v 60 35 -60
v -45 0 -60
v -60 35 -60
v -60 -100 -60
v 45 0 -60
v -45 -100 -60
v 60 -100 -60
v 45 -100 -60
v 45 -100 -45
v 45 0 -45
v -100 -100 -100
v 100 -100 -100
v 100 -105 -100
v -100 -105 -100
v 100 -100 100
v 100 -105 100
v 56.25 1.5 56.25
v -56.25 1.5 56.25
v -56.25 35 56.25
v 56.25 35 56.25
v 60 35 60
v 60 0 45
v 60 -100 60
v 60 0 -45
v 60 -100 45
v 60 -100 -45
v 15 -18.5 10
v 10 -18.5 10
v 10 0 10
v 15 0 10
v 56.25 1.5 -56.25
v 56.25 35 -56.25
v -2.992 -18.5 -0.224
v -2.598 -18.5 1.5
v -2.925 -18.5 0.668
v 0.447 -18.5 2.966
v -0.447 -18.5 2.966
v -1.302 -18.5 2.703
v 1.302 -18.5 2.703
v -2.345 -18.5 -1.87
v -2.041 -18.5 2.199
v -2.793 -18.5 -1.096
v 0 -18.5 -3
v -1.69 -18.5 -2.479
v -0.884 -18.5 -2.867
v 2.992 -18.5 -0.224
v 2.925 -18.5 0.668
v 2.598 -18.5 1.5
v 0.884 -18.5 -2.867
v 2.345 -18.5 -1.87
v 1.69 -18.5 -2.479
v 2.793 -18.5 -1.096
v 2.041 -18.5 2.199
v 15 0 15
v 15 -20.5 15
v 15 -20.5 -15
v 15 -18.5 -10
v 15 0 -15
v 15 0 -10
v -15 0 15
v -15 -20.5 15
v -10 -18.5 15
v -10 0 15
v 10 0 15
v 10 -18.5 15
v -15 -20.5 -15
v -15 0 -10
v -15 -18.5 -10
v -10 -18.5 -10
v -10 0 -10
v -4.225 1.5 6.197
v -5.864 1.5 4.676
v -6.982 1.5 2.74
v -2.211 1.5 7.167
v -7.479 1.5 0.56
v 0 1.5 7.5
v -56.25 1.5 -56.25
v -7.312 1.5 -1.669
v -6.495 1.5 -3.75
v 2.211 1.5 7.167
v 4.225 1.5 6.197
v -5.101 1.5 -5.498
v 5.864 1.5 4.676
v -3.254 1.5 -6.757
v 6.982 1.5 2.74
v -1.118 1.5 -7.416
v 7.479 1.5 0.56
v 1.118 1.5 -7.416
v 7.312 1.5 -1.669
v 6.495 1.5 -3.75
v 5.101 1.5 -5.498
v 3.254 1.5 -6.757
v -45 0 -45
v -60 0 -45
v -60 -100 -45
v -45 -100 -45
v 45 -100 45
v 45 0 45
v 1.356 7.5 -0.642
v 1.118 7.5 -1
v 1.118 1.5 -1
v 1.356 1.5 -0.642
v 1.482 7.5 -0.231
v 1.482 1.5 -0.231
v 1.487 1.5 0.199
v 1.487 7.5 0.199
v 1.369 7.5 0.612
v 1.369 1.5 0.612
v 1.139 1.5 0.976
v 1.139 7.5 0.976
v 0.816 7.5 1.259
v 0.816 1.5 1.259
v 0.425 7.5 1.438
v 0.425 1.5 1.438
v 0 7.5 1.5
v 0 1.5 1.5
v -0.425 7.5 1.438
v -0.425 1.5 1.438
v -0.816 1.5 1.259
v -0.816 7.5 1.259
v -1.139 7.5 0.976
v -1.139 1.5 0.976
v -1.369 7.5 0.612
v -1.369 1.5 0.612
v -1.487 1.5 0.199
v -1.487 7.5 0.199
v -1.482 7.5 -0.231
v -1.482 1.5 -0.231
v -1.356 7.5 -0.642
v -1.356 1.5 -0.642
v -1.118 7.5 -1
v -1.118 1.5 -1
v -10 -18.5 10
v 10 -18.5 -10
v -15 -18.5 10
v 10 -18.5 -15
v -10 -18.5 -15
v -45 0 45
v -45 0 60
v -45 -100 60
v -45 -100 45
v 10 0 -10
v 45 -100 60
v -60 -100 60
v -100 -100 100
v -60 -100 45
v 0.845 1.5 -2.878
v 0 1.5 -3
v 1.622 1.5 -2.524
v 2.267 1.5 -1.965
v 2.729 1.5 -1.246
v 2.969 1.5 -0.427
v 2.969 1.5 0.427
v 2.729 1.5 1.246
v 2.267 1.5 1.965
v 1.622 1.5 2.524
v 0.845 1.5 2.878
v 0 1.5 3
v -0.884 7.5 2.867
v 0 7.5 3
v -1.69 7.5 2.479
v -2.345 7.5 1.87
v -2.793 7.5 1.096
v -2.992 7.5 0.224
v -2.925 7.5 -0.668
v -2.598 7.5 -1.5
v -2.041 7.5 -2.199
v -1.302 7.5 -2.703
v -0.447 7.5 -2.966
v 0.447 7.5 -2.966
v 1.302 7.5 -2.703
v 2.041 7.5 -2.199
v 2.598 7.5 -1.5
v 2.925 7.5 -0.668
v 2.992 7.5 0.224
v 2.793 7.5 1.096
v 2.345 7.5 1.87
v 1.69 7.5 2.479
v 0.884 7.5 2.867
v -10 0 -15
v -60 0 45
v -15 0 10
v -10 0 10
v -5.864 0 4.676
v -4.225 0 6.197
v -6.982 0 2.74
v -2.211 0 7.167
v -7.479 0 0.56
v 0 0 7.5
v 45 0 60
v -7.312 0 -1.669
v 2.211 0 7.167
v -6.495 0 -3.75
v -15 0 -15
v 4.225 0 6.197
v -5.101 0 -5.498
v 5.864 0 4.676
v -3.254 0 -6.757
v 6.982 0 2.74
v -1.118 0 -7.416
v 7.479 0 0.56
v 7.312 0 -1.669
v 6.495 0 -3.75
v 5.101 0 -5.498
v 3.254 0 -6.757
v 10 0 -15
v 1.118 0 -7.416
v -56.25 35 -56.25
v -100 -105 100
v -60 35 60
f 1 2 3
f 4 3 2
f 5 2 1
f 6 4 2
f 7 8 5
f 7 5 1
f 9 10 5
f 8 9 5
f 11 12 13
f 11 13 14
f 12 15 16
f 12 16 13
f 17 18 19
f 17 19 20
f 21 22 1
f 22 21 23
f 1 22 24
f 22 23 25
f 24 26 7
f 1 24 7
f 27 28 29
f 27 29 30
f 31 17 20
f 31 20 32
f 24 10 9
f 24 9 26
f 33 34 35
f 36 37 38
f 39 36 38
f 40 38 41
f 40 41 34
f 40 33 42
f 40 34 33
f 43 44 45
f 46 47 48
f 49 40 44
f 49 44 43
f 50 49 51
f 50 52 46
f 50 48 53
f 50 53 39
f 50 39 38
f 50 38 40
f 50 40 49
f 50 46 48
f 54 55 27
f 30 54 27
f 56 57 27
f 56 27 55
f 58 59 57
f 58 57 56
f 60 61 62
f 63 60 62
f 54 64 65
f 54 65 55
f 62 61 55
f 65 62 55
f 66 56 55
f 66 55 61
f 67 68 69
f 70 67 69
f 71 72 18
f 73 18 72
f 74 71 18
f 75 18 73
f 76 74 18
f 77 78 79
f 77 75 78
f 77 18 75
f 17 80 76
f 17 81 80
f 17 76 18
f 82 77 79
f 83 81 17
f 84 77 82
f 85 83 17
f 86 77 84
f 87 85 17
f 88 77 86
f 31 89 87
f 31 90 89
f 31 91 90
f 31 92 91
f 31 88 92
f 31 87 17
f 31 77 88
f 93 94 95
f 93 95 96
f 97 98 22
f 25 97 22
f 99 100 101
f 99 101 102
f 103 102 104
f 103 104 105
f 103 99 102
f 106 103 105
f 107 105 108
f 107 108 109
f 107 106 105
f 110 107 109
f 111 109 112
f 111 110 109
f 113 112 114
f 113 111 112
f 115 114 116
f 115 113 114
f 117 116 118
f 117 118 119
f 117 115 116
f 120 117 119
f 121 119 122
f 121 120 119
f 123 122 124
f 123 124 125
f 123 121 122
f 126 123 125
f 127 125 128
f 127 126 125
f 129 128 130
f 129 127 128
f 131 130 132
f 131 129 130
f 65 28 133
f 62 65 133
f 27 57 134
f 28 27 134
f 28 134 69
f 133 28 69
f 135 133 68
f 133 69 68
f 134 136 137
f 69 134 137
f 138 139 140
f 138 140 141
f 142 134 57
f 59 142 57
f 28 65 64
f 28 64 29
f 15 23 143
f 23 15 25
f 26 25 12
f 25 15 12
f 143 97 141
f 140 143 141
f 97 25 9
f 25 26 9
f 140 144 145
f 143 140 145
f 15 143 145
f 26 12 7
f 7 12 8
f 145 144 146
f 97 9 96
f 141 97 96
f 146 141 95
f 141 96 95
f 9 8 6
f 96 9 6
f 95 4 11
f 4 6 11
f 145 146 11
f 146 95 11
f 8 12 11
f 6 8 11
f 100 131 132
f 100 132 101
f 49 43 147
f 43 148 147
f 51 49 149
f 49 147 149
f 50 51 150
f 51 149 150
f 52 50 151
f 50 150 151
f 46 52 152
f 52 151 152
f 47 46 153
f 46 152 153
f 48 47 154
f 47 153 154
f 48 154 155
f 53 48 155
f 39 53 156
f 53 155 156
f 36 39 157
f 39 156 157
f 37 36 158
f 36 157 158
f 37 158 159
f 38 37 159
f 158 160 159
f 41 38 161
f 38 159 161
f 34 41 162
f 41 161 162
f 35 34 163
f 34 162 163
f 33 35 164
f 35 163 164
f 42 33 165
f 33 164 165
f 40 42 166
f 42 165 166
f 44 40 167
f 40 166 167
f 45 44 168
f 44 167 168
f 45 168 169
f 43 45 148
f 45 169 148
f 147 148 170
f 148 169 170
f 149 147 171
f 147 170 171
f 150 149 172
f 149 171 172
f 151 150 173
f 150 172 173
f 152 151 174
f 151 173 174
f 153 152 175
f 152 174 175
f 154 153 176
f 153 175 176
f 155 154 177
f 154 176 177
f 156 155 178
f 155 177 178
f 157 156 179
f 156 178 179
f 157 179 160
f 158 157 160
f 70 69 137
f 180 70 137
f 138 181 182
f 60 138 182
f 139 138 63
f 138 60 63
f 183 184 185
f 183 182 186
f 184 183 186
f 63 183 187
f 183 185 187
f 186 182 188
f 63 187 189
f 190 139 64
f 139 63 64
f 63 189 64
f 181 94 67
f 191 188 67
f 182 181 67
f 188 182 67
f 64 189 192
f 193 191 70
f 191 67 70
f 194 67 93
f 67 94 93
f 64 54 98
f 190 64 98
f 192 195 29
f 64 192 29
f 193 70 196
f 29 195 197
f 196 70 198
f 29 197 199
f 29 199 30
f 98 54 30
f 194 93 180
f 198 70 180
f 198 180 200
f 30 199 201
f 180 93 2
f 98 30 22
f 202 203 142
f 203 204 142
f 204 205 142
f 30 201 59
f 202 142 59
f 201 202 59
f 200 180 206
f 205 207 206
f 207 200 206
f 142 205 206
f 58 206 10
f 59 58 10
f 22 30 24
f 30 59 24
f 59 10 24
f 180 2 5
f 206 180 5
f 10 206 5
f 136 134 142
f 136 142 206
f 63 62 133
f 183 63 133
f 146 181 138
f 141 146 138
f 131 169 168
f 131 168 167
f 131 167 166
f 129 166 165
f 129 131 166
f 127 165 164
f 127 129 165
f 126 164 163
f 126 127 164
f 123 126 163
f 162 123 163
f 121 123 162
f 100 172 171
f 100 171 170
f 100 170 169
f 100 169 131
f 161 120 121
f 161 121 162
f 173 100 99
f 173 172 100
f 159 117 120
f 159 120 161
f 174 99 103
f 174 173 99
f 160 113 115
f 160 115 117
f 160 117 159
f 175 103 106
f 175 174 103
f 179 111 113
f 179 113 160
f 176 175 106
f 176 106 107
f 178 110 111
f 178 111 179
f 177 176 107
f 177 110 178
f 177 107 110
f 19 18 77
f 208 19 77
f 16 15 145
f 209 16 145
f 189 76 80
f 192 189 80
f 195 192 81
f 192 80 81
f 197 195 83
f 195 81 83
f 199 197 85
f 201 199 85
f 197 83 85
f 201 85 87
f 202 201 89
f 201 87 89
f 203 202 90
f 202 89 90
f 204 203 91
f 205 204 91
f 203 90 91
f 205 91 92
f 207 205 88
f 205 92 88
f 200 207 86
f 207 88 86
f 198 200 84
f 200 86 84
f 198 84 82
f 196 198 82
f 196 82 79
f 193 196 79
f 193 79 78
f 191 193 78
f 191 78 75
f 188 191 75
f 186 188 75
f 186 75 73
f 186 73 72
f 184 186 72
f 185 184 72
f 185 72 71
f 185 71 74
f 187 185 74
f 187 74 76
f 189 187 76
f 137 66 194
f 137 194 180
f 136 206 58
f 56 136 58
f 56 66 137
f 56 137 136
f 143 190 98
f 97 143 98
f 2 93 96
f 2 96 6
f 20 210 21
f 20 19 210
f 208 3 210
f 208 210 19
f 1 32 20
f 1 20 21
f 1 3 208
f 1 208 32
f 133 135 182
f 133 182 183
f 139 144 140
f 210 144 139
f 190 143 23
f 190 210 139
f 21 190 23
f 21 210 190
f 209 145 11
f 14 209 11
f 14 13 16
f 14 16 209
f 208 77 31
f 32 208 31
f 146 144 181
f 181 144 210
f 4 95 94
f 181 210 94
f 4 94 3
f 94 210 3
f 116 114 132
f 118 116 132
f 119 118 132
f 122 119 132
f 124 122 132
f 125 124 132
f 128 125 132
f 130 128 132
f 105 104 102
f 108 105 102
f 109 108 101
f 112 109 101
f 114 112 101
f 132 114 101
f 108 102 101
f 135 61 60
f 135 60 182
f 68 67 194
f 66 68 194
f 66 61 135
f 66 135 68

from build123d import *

# Parameters (mm, degrees)
SKETCH_1_W          = 112.5
SKETCH_1_H          = 112.5
EXTRUDE_1_DEPTH     = 1.5
SKETCH_2_R          = 3
EXTRUDE_2_DEPTH     = 6
CUT_EXTRUDE_1_DEPTH = 6
SKETCH_4_W          = 120
SKETCH_4_H          = 120
SKETCH_4_W_2        = 112.5
SKETCH_4_H_2        = 112.5
EXTRUDE_3_DEPTH     = 35
SKETCH_5_W          = 15
SKETCH_5_H          = 15
EXTRUDE_4_DEPTH     = 100
SKETCH_6_W          = 200
SKETCH_6_H          = 200
EXTRUDE_5_DEPTH     = 5
CUT_EXTRUDE_3_REACH = 179.037
SKETCH_7_R          = 7.5
SKETCH_8_R          = 3
EXTRUDE_6_DEPTH     = 20
SKETCH_9_W          = 30
SKETCH_9_H          = 30
EXTRUDE_7_DEPTH     = 2
EXTRUDE_8_REACH     = 167.778
SKETCH_10_W         = 5
SKETCH_10_H         = 5


with BuildPart() as part:
    # 草图1 → 凸台-拉伸1 (new body)
    with BuildSketch(Plane(origin=(0, 0, 0), x_dir=(1, 0, 0), z_dir=(0, 1, 0))):
        Rectangle(SKETCH_1_W, SKETCH_1_H)
    extrude(amount=EXTRUDE_1_DEPTH)

    # 草图2 → 凸台-拉伸2 (add)
    with BuildSketch(Plane(origin=(0, 1.5, 0), x_dir=(1, 0, 0), z_dir=(0, 1, 0))):
        with Locations(Location((0, 0, 0), (0, 0, 270))):
            Circle(SKETCH_2_R)
    extrude(amount=EXTRUDE_2_DEPTH)

    # 草图3 → 切除-拉伸1 (cut)
    with BuildSketch(Plane(origin=(0, 7.5, 0), x_dir=(1, 0, 0), z_dir=(0, 1, 0))):
        with BuildLine():
            Line((-1.118033989, 1), (1.118033989, 1))
            ThreePointArc((1.118033989, 1), (0, -1.5), (-1.118033989, 1))
        make_face()
    extrude(amount=-CUT_EXTRUDE_1_DEPTH, mode=Mode.SUBTRACT)

    # 草图4 → 凸台-拉伸3 (add)
    with BuildSketch(Plane(origin=(0, 0, 0), x_dir=(1, 0, 0), z_dir=(0, 1, 0))):
        Rectangle(SKETCH_4_W, SKETCH_4_H)
        Rectangle(SKETCH_4_W_2, SKETCH_4_H_2, mode=Mode.SUBTRACT)
    extrude(amount=EXTRUDE_3_DEPTH)

    # 草图5 → 凸台-拉伸4 (add)
    with BuildSketch(Plane(origin=(0, 0, 0), x_dir=(1, 0, 0), z_dir=(0, 1, 0))):
        with Locations((-52.5, -52.5)):
            Rectangle(SKETCH_5_W, SKETCH_5_H)
        with Locations((52.5, -52.5)):
            Rectangle(SKETCH_5_W, SKETCH_5_H)
        with Locations((52.5, 52.5)):
            Rectangle(SKETCH_5_W, SKETCH_5_H)
        with Locations((-52.5, 52.5)):
            Rectangle(SKETCH_5_W, SKETCH_5_H)
    extrude(amount=-EXTRUDE_4_DEPTH)

    # 草图6 → 凸台-拉伸5 (add)
    with BuildSketch(Plane(origin=(0, -100, 0), x_dir=(-1, 0, 0), z_dir=(0, -1, 0))):
        Rectangle(SKETCH_6_W, SKETCH_6_H)
    extrude(amount=EXTRUDE_5_DEPTH)

    # 草图7 → 切除-拉伸3 (cut, up to next)
    with BuildSketch(Plane(origin=(0, 1.5, 0), x_dir=(1, 0, 0), z_dir=(0, 1, 0)), mode=Mode.PRIVATE) as cut_extrude_3_sk1:
        with Locations(Location((0, 0, 0), (0, 0, 270))):
            Circle(SKETCH_7_R)
    cut_extrude_3_tool1 = extrude(cut_extrude_3_sk1.sketch, amount=-CUT_EXTRUDE_3_REACH, mode=Mode.PRIVATE) & part.part
    add(cut_extrude_3_tool1.solids().sort_by_distance((0, 1.5, 0))[0], mode=Mode.SUBTRACT)


with BuildPart() as cut_extrude_3_piece_1:
    # of the separate pieces the step leaves, piece 1, a body of its own (cut_extrude_3_pieces)
    add(part.part.solids().sort_by_distance((100, -100, -100))[0])

    # 草图10 → 凸台-拉伸8 (add, up to next)
    with BuildSketch(Plane(origin=(0, -18.5, 0), x_dir=(1, 0, 0), z_dir=(0, 1, 0)), mode=Mode.PRIVATE) as extrude_8_sk1:
        with Locations((-12.5, 12.5)):
            Rectangle(SKETCH_10_W, SKETCH_10_H)
    extrude_8_tool1 = extrude(extrude_8_sk1.sketch, amount=EXTRUDE_8_REACH, mode=Mode.PRIVATE) - cut_extrude_3_piece_1.part
    # 草图10 → 凸台-拉伸8 (add, up to next)
    with BuildSketch(Plane(origin=(0, -18.5, 0), x_dir=(1, 0, 0), z_dir=(0, 1, 0)), mode=Mode.PRIVATE) as extrude_8_sk2:
        with Locations((12.5, -12.5)):
            Rectangle(SKETCH_10_W, SKETCH_10_H)
    extrude_8_tool2 = extrude(extrude_8_sk2.sketch, amount=EXTRUDE_8_REACH, mode=Mode.PRIVATE) - cut_extrude_3_piece_1.part
    # 草图10 → 凸台-拉伸8 (add, up to next)
    with BuildSketch(Plane(origin=(0, -18.5, 0), x_dir=(1, 0, 0), z_dir=(0, 1, 0)), mode=Mode.PRIVATE) as extrude_8_sk3:
        with Locations((12.5, 12.5)):
            Rectangle(SKETCH_10_W, SKETCH_10_H)
    extrude_8_tool3 = extrude(extrude_8_sk3.sketch, amount=EXTRUDE_8_REACH, mode=Mode.PRIVATE) - cut_extrude_3_piece_1.part
    # 草图10 → 凸台-拉伸8 (add, up to next)
    with BuildSketch(Plane(origin=(0, -18.5, 0), x_dir=(1, 0, 0), z_dir=(0, 1, 0)), mode=Mode.PRIVATE) as extrude_8_sk4:
        with Locations((-12.5, -12.5)):
            Rectangle(SKETCH_10_W, SKETCH_10_H)
    extrude_8_tool4 = extrude(extrude_8_sk4.sketch, amount=EXTRUDE_8_REACH, mode=Mode.PRIVATE) - cut_extrude_3_piece_1.part


with BuildPart() as cut_extrude_3_piece_2:
    # of the separate pieces the step leaves, piece 2, a body of its own (cut_extrude_3_pieces)
    add(part.part.solids().sort_by_distance((0, 1.5, 3))[0])

    # 草图8 → 凸台-拉伸6 (add)
    with BuildSketch(Plane(origin=(0, 1.5, 0), x_dir=(-1, 0, 0), z_dir=(0, -1, 0))):
        with Locations(Location((0, 0, 0), (0, 0, 90))):
            Circle(SKETCH_8_R)
    extrude(amount=EXTRUDE_6_DEPTH)


with BuildPart() as body_3:
    # 草图9 → 凸台-拉伸7 (new body)
    with BuildSketch(Plane(origin=(0, -18.5, 0), x_dir=(-1, 0, 0), z_dir=(0, -1, 0))):
        Rectangle(SKETCH_9_W, SKETCH_9_H)
    extrude(amount=EXTRUDE_7_DEPTH)


with BuildPart() as cut_extrude_3_piece_1_1:
    add(cut_extrude_3_piece_1.part)

    add(body_3.part)  # 凸台-拉伸8 merges body 3
    add(extrude_8_tool1.solids().sort_by_distance((-12.5, -18.5, -12.5))[0])
    add(extrude_8_tool2.solids().sort_by_distance((12.5, -18.5, 12.5))[0])
    add(extrude_8_tool3.solids().sort_by_distance((12.5, -18.5, -12.5))[0])
    add(extrude_8_tool4.solids().sort_by_distance((-12.5, -18.5, 12.5))[0])


solid = Compound([cut_extrude_3_piece_2.part, cut_extrude_3_piece_1_1.part])
